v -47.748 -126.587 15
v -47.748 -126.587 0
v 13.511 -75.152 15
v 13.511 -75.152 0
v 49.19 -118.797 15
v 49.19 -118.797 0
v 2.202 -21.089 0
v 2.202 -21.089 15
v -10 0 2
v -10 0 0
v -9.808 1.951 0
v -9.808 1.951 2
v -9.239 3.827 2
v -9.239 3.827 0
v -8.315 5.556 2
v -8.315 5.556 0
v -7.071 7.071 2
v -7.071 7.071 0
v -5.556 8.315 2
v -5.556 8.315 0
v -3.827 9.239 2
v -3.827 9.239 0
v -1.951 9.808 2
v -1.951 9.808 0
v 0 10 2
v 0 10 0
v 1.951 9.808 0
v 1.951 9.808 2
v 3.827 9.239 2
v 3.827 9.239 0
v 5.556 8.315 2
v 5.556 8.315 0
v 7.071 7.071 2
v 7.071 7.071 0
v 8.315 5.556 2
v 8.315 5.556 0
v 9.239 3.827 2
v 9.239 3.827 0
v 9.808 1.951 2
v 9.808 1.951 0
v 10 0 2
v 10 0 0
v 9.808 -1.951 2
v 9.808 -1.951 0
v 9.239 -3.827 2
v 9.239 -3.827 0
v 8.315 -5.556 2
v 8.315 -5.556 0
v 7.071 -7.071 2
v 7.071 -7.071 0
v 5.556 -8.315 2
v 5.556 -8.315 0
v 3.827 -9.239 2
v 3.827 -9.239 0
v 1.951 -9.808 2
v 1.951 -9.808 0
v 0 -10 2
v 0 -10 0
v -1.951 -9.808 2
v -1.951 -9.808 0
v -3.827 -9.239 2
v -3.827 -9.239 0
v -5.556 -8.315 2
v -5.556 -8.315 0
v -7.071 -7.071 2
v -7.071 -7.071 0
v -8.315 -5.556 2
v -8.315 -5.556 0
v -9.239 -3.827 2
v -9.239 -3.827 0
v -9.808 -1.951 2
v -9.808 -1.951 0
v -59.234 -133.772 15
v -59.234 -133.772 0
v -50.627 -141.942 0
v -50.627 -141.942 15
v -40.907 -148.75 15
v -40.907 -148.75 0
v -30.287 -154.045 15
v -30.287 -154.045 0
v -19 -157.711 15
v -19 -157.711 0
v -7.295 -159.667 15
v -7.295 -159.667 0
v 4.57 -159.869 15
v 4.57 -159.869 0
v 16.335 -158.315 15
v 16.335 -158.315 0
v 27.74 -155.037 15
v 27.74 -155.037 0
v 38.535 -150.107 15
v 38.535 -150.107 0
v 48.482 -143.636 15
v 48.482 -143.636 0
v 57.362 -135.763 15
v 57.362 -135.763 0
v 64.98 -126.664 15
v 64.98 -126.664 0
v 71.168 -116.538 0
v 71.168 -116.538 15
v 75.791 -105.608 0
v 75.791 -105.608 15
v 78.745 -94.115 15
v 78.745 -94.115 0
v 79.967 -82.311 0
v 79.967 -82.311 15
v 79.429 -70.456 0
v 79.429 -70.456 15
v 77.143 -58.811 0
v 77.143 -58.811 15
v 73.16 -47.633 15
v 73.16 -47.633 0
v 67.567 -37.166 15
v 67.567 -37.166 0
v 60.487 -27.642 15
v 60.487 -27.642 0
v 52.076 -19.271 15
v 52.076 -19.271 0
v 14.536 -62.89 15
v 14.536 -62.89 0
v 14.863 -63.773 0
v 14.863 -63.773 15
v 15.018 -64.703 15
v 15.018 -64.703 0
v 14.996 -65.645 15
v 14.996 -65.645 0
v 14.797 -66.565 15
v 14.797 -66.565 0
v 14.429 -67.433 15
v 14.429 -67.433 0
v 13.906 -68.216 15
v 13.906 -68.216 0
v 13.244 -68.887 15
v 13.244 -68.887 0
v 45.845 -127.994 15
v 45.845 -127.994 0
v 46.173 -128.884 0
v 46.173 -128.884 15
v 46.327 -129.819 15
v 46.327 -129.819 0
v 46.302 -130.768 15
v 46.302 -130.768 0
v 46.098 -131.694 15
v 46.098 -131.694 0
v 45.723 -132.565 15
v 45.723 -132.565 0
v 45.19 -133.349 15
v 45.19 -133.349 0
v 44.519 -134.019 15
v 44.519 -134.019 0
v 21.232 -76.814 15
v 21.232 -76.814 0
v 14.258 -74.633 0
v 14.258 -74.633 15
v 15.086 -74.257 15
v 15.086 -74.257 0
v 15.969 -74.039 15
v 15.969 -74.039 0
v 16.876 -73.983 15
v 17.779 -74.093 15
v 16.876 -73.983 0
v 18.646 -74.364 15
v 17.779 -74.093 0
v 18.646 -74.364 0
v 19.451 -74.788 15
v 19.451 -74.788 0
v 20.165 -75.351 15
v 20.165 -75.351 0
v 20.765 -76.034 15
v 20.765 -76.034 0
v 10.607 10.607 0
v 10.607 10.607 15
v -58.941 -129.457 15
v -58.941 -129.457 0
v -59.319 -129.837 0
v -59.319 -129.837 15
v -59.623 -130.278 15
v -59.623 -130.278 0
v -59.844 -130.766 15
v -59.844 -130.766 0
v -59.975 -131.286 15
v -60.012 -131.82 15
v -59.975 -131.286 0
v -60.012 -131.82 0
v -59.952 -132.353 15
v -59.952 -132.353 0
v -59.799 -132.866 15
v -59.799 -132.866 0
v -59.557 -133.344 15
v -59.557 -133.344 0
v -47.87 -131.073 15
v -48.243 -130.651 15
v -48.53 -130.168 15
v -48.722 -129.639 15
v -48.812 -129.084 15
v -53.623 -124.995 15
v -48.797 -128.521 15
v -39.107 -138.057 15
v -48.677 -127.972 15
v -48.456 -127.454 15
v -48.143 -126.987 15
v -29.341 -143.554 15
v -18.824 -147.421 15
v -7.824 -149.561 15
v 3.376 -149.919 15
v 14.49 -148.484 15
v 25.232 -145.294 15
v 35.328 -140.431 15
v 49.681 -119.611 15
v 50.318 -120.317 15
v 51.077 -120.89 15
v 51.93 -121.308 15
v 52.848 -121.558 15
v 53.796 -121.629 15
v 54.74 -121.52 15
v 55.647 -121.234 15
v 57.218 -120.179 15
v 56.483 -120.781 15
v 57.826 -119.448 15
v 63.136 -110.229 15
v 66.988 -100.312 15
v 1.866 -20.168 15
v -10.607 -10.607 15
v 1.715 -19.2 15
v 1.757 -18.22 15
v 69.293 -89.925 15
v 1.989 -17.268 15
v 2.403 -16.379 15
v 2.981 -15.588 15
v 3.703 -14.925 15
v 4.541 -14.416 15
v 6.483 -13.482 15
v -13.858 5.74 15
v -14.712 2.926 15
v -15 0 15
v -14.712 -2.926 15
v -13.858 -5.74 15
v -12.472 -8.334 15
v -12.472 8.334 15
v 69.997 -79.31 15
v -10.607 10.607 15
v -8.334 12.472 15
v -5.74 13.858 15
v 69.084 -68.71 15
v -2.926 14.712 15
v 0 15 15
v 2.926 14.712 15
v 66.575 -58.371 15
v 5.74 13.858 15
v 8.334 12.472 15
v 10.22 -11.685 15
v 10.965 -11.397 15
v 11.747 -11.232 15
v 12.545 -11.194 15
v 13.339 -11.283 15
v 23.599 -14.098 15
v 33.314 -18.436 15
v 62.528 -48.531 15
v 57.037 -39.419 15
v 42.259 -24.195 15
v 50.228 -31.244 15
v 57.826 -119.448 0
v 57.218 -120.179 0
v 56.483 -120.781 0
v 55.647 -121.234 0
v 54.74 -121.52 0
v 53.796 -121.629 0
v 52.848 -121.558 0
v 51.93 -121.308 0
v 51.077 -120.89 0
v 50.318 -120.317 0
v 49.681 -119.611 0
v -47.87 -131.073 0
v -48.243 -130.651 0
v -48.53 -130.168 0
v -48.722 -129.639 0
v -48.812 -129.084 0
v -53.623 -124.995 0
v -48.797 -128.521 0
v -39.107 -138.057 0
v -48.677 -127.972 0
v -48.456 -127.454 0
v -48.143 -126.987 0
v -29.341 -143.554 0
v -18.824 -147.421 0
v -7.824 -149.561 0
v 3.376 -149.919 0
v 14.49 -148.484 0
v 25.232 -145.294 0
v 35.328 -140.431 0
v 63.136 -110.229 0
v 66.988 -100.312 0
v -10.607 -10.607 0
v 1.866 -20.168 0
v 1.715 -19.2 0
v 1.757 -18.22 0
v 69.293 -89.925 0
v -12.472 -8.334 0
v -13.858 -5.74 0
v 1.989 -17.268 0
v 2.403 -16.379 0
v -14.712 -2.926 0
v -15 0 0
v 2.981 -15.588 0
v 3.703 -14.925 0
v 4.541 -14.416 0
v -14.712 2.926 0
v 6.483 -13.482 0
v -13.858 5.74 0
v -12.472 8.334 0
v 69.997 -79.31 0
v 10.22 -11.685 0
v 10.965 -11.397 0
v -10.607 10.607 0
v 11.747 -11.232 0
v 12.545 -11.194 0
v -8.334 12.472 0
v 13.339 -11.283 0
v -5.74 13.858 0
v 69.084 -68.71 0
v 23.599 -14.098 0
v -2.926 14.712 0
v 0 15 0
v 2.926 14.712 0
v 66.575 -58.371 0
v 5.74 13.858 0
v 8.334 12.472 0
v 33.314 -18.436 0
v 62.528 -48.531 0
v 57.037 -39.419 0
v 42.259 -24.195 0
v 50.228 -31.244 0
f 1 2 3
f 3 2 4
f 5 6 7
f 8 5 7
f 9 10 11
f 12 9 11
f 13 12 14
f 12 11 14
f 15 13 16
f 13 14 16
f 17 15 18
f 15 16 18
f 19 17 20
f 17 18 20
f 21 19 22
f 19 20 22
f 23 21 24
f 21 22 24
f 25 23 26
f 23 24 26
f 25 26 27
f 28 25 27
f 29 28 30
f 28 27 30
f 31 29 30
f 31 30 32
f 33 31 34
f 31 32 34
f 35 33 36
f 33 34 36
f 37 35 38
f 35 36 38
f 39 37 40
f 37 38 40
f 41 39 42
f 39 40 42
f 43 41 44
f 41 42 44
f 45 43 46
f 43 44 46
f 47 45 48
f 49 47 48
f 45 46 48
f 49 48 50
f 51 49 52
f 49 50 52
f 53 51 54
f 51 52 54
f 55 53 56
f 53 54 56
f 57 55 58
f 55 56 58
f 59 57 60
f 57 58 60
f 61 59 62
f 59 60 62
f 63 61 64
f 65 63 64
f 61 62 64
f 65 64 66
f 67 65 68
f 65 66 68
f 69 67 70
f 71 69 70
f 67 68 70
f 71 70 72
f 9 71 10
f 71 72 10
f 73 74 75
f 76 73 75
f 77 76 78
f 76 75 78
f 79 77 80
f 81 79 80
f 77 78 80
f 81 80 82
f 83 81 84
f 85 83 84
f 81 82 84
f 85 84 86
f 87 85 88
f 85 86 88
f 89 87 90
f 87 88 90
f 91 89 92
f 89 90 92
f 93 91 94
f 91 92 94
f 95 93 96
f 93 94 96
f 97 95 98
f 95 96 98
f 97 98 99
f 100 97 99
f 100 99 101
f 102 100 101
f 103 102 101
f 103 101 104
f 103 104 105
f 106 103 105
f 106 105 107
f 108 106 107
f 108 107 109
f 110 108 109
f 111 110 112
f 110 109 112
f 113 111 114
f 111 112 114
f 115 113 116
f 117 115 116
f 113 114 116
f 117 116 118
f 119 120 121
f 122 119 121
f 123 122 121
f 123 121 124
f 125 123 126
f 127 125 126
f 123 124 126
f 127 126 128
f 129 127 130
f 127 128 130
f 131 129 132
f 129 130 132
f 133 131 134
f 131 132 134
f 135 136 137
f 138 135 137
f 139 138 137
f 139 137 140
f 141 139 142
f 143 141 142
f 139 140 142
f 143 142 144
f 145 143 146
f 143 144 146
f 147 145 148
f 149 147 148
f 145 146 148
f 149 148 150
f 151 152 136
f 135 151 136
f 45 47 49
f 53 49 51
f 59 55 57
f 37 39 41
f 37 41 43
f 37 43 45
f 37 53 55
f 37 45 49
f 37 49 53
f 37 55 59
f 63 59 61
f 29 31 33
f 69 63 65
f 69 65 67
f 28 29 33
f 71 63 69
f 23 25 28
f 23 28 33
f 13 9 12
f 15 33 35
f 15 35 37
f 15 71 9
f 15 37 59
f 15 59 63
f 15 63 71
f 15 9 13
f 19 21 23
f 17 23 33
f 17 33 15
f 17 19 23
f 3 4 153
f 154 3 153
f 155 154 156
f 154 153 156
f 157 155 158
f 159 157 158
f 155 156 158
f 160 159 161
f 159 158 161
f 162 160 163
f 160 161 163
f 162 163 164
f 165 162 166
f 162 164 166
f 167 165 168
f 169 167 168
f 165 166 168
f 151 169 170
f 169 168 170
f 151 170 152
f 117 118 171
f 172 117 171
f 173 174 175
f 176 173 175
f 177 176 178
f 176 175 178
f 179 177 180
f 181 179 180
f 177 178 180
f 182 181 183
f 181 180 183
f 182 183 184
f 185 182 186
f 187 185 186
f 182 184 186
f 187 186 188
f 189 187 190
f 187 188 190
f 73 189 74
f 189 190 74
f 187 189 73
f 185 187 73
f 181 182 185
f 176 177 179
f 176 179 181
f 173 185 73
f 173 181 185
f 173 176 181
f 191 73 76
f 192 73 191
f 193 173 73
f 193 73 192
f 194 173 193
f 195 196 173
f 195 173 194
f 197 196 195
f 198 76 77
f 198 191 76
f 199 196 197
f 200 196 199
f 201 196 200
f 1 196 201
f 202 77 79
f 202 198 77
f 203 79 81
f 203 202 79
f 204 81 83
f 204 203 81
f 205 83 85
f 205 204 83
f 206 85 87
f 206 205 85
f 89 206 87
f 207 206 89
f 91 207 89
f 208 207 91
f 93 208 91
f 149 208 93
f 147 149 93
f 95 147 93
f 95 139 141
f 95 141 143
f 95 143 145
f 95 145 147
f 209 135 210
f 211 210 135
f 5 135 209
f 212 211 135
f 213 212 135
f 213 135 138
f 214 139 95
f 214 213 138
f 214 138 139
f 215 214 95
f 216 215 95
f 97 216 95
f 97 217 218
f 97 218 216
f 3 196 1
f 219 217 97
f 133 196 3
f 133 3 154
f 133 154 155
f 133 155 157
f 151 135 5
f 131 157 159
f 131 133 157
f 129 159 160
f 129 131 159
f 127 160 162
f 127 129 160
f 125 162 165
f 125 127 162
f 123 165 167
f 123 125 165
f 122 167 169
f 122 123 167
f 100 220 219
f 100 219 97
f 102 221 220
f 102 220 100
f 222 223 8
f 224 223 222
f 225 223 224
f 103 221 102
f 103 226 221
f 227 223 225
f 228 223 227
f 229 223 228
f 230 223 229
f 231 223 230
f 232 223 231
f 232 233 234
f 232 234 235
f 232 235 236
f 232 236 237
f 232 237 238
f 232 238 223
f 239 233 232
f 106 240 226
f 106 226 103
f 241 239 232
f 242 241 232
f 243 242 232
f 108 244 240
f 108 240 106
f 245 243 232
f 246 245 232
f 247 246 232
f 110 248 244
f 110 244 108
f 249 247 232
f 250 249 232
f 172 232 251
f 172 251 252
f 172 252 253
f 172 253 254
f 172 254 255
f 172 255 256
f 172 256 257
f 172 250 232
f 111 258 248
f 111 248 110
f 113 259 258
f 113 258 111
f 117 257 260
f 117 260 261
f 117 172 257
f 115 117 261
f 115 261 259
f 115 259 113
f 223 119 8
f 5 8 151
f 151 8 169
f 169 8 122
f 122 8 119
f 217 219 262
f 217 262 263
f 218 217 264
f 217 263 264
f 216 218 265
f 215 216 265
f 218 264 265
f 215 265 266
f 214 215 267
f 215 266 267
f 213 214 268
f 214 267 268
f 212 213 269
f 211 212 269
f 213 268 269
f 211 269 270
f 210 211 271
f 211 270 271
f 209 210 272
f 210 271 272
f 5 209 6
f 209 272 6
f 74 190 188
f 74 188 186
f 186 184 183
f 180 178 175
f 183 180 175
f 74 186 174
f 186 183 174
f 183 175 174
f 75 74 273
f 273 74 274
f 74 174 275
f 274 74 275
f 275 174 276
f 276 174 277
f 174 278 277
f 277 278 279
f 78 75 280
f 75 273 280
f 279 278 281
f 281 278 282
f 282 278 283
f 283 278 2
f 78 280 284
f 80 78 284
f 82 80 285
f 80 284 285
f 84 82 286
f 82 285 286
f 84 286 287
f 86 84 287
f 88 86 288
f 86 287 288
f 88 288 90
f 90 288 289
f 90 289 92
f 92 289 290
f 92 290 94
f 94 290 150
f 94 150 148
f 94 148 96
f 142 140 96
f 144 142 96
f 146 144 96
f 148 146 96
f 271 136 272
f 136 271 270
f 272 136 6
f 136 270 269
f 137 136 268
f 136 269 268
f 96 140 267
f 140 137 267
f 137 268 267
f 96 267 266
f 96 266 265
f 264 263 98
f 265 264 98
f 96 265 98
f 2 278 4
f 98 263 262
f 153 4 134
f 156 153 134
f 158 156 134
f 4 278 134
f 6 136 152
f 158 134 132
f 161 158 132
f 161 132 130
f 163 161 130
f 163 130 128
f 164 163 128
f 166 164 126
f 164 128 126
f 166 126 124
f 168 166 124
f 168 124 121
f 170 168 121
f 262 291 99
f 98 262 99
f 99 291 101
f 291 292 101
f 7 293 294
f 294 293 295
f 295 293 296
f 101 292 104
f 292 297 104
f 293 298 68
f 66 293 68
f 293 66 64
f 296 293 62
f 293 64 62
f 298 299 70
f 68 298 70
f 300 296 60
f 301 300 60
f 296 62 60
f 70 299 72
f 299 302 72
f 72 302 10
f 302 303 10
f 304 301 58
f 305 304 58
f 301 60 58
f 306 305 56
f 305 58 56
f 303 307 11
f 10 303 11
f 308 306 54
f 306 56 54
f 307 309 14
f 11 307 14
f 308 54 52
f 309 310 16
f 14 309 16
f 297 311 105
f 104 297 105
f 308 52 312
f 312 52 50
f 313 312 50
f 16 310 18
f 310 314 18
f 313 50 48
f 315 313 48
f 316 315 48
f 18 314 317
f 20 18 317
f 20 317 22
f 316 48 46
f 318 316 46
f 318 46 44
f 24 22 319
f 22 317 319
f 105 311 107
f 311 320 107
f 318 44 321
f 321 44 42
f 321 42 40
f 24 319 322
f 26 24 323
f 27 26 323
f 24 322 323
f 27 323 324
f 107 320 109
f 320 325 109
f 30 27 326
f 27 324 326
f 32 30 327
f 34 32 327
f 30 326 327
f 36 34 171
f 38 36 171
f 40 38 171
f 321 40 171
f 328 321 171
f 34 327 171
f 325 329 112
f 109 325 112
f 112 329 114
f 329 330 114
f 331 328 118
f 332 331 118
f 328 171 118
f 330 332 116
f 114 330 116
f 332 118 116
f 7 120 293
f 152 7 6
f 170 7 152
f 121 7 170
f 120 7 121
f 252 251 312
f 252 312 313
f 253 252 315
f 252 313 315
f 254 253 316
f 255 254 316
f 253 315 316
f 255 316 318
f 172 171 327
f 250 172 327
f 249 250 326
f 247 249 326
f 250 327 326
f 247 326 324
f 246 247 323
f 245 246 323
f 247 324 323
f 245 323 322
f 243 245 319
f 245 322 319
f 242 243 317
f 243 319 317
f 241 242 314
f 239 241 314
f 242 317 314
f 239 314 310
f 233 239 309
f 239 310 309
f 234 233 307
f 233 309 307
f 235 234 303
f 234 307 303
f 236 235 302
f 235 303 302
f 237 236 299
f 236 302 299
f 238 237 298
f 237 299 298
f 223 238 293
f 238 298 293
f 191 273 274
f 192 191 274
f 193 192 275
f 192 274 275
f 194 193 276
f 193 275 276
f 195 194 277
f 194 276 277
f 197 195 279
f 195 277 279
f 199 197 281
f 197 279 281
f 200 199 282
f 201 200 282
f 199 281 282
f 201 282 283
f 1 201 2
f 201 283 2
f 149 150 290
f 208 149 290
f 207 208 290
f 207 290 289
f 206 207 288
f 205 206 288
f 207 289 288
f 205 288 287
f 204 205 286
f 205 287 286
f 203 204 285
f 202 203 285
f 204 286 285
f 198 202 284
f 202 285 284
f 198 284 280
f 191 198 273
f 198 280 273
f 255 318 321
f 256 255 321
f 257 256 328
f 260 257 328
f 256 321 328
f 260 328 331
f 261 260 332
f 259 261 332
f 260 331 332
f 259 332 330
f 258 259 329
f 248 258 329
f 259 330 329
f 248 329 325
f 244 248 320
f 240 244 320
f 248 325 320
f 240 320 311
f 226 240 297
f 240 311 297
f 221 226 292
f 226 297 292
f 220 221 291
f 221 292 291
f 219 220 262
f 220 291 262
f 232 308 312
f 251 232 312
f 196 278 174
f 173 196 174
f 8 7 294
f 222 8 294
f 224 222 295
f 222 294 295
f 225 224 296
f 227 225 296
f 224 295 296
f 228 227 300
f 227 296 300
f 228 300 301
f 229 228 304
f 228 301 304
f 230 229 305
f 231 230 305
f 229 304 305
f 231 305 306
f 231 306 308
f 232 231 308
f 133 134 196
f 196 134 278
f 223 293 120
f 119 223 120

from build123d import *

# Parameters (mm, degrees)
EXTRUDE_1_DEPTH     = 15
CUT_EXTRUDE_START   = -15
CUT_EXTRUDE_1_DEPTH = 15
SKETCH_8_R          = 10
CUT_EXTRUDE_3_DEPTH = 2


with BuildPart() as part:
    # Sketch 4 → Extrude 1 (new body)
    with BuildSketch(Plane.XY):
        with BuildLine():
            Line((-53.623111018, -124.995132678), (-58.940636287, -129.45706617))
            ThreePointArc((-58.940636287, -129.45706617), (-60.005384698, -131.552012131), (-59.233530865, -133.771635843))
            ThreePointArc((-59.233530865, -133.771635843), (57.362306223, -135.763481103), (52.076178918, -19.270504783))
            Line((52.076178918, -19.270504783), (10.606601718, 10.606601718))
            ThreePointArc((10.606601718, 10.606601718), (-10.606601718, 10.606601718), (-10.606601718, -10.606601718))
            Line((-10.606601718, -10.606601718), (14.536280154, -62.889638219))
            ThreePointArc((14.536280154, -62.889638219), (14.918089499, -66.109676181), (13.244185189, -68.886809092))
            Line((13.244185189, -68.886809092), (-53.623111018, -124.995132678))
        make_face()
        with BuildLine():
            Line((21.232400696, -76.813798404), (45.844843506, -127.993820346))
            ThreePointArc((45.844843506, -127.993820346), (46.221944165, -131.235480845), (44.518718993, -134.019289696))
            ThreePointArc((44.518718993, -134.019289696), (-2.231208213, -149.964431749), (-47.870174388, -131.072951785))
            ThreePointArc((-47.870174388, -131.072951785), (-48.817477846, -128.802229421), (-47.747678417, -126.586582094))
            Line((-47.747678417, -126.586582094), (13.511229465, -75.151532228))
            ThreePointArc((13.511229465, -75.151532228), (17.77869109, -74.092739753), (21.232400696, -76.813798404))
        make_face(mode=Mode.SUBTRACT)
    extrude(amount=EXTRUDE_1_DEPTH)

    # Sketch 6 → Cut-Extrude 1 (cut)
    with BuildSketch(Plane.XY.offset(15).offset(CUT_EXTRUDE_START)):
        with BuildLine():
            Line((49.189589797, -118.797265215), (2.201751786, -21.089020696))
            ThreePointArc((2.201751786, -21.089020696), (1.989274209, -17.268089629), (4.540836142, -14.416039025))
            Line((4.540836142, -14.416039025), (6.483415605, -13.48185369))
            Line((6.483415605, -13.48185369), (10.219658847, -11.685096486))
            ThreePointArc((10.219658847, -11.685096486), (11.747077013, -11.232198087), (13.339423466, -11.282754846))
            ThreePointArc((13.339423466, -11.282754846), (64.738421392, -53.37413296), (57.826055334, -119.448033215))
            ThreePointArc((57.826055334, -119.448033215), (53.319931874, -121.616182211), (49.189589797, -118.797265215))
        make_face()
    extrude(amount=CUT_EXTRUDE_1_DEPTH, mode=Mode.SUBTRACT)

    # Sketch 8 → Cut-Extrude 3 (cut)
    with BuildSketch(Plane(origin=(0, 0, 0), x_dir=(-1, 0, 0), z_dir=(0, 0, -1))):
        Circle(SKETCH_8_R)
    extrude(amount=-CUT_EXTRUDE_3_DEPTH, mode=Mode.SUBTRACT)


solid = part.part
